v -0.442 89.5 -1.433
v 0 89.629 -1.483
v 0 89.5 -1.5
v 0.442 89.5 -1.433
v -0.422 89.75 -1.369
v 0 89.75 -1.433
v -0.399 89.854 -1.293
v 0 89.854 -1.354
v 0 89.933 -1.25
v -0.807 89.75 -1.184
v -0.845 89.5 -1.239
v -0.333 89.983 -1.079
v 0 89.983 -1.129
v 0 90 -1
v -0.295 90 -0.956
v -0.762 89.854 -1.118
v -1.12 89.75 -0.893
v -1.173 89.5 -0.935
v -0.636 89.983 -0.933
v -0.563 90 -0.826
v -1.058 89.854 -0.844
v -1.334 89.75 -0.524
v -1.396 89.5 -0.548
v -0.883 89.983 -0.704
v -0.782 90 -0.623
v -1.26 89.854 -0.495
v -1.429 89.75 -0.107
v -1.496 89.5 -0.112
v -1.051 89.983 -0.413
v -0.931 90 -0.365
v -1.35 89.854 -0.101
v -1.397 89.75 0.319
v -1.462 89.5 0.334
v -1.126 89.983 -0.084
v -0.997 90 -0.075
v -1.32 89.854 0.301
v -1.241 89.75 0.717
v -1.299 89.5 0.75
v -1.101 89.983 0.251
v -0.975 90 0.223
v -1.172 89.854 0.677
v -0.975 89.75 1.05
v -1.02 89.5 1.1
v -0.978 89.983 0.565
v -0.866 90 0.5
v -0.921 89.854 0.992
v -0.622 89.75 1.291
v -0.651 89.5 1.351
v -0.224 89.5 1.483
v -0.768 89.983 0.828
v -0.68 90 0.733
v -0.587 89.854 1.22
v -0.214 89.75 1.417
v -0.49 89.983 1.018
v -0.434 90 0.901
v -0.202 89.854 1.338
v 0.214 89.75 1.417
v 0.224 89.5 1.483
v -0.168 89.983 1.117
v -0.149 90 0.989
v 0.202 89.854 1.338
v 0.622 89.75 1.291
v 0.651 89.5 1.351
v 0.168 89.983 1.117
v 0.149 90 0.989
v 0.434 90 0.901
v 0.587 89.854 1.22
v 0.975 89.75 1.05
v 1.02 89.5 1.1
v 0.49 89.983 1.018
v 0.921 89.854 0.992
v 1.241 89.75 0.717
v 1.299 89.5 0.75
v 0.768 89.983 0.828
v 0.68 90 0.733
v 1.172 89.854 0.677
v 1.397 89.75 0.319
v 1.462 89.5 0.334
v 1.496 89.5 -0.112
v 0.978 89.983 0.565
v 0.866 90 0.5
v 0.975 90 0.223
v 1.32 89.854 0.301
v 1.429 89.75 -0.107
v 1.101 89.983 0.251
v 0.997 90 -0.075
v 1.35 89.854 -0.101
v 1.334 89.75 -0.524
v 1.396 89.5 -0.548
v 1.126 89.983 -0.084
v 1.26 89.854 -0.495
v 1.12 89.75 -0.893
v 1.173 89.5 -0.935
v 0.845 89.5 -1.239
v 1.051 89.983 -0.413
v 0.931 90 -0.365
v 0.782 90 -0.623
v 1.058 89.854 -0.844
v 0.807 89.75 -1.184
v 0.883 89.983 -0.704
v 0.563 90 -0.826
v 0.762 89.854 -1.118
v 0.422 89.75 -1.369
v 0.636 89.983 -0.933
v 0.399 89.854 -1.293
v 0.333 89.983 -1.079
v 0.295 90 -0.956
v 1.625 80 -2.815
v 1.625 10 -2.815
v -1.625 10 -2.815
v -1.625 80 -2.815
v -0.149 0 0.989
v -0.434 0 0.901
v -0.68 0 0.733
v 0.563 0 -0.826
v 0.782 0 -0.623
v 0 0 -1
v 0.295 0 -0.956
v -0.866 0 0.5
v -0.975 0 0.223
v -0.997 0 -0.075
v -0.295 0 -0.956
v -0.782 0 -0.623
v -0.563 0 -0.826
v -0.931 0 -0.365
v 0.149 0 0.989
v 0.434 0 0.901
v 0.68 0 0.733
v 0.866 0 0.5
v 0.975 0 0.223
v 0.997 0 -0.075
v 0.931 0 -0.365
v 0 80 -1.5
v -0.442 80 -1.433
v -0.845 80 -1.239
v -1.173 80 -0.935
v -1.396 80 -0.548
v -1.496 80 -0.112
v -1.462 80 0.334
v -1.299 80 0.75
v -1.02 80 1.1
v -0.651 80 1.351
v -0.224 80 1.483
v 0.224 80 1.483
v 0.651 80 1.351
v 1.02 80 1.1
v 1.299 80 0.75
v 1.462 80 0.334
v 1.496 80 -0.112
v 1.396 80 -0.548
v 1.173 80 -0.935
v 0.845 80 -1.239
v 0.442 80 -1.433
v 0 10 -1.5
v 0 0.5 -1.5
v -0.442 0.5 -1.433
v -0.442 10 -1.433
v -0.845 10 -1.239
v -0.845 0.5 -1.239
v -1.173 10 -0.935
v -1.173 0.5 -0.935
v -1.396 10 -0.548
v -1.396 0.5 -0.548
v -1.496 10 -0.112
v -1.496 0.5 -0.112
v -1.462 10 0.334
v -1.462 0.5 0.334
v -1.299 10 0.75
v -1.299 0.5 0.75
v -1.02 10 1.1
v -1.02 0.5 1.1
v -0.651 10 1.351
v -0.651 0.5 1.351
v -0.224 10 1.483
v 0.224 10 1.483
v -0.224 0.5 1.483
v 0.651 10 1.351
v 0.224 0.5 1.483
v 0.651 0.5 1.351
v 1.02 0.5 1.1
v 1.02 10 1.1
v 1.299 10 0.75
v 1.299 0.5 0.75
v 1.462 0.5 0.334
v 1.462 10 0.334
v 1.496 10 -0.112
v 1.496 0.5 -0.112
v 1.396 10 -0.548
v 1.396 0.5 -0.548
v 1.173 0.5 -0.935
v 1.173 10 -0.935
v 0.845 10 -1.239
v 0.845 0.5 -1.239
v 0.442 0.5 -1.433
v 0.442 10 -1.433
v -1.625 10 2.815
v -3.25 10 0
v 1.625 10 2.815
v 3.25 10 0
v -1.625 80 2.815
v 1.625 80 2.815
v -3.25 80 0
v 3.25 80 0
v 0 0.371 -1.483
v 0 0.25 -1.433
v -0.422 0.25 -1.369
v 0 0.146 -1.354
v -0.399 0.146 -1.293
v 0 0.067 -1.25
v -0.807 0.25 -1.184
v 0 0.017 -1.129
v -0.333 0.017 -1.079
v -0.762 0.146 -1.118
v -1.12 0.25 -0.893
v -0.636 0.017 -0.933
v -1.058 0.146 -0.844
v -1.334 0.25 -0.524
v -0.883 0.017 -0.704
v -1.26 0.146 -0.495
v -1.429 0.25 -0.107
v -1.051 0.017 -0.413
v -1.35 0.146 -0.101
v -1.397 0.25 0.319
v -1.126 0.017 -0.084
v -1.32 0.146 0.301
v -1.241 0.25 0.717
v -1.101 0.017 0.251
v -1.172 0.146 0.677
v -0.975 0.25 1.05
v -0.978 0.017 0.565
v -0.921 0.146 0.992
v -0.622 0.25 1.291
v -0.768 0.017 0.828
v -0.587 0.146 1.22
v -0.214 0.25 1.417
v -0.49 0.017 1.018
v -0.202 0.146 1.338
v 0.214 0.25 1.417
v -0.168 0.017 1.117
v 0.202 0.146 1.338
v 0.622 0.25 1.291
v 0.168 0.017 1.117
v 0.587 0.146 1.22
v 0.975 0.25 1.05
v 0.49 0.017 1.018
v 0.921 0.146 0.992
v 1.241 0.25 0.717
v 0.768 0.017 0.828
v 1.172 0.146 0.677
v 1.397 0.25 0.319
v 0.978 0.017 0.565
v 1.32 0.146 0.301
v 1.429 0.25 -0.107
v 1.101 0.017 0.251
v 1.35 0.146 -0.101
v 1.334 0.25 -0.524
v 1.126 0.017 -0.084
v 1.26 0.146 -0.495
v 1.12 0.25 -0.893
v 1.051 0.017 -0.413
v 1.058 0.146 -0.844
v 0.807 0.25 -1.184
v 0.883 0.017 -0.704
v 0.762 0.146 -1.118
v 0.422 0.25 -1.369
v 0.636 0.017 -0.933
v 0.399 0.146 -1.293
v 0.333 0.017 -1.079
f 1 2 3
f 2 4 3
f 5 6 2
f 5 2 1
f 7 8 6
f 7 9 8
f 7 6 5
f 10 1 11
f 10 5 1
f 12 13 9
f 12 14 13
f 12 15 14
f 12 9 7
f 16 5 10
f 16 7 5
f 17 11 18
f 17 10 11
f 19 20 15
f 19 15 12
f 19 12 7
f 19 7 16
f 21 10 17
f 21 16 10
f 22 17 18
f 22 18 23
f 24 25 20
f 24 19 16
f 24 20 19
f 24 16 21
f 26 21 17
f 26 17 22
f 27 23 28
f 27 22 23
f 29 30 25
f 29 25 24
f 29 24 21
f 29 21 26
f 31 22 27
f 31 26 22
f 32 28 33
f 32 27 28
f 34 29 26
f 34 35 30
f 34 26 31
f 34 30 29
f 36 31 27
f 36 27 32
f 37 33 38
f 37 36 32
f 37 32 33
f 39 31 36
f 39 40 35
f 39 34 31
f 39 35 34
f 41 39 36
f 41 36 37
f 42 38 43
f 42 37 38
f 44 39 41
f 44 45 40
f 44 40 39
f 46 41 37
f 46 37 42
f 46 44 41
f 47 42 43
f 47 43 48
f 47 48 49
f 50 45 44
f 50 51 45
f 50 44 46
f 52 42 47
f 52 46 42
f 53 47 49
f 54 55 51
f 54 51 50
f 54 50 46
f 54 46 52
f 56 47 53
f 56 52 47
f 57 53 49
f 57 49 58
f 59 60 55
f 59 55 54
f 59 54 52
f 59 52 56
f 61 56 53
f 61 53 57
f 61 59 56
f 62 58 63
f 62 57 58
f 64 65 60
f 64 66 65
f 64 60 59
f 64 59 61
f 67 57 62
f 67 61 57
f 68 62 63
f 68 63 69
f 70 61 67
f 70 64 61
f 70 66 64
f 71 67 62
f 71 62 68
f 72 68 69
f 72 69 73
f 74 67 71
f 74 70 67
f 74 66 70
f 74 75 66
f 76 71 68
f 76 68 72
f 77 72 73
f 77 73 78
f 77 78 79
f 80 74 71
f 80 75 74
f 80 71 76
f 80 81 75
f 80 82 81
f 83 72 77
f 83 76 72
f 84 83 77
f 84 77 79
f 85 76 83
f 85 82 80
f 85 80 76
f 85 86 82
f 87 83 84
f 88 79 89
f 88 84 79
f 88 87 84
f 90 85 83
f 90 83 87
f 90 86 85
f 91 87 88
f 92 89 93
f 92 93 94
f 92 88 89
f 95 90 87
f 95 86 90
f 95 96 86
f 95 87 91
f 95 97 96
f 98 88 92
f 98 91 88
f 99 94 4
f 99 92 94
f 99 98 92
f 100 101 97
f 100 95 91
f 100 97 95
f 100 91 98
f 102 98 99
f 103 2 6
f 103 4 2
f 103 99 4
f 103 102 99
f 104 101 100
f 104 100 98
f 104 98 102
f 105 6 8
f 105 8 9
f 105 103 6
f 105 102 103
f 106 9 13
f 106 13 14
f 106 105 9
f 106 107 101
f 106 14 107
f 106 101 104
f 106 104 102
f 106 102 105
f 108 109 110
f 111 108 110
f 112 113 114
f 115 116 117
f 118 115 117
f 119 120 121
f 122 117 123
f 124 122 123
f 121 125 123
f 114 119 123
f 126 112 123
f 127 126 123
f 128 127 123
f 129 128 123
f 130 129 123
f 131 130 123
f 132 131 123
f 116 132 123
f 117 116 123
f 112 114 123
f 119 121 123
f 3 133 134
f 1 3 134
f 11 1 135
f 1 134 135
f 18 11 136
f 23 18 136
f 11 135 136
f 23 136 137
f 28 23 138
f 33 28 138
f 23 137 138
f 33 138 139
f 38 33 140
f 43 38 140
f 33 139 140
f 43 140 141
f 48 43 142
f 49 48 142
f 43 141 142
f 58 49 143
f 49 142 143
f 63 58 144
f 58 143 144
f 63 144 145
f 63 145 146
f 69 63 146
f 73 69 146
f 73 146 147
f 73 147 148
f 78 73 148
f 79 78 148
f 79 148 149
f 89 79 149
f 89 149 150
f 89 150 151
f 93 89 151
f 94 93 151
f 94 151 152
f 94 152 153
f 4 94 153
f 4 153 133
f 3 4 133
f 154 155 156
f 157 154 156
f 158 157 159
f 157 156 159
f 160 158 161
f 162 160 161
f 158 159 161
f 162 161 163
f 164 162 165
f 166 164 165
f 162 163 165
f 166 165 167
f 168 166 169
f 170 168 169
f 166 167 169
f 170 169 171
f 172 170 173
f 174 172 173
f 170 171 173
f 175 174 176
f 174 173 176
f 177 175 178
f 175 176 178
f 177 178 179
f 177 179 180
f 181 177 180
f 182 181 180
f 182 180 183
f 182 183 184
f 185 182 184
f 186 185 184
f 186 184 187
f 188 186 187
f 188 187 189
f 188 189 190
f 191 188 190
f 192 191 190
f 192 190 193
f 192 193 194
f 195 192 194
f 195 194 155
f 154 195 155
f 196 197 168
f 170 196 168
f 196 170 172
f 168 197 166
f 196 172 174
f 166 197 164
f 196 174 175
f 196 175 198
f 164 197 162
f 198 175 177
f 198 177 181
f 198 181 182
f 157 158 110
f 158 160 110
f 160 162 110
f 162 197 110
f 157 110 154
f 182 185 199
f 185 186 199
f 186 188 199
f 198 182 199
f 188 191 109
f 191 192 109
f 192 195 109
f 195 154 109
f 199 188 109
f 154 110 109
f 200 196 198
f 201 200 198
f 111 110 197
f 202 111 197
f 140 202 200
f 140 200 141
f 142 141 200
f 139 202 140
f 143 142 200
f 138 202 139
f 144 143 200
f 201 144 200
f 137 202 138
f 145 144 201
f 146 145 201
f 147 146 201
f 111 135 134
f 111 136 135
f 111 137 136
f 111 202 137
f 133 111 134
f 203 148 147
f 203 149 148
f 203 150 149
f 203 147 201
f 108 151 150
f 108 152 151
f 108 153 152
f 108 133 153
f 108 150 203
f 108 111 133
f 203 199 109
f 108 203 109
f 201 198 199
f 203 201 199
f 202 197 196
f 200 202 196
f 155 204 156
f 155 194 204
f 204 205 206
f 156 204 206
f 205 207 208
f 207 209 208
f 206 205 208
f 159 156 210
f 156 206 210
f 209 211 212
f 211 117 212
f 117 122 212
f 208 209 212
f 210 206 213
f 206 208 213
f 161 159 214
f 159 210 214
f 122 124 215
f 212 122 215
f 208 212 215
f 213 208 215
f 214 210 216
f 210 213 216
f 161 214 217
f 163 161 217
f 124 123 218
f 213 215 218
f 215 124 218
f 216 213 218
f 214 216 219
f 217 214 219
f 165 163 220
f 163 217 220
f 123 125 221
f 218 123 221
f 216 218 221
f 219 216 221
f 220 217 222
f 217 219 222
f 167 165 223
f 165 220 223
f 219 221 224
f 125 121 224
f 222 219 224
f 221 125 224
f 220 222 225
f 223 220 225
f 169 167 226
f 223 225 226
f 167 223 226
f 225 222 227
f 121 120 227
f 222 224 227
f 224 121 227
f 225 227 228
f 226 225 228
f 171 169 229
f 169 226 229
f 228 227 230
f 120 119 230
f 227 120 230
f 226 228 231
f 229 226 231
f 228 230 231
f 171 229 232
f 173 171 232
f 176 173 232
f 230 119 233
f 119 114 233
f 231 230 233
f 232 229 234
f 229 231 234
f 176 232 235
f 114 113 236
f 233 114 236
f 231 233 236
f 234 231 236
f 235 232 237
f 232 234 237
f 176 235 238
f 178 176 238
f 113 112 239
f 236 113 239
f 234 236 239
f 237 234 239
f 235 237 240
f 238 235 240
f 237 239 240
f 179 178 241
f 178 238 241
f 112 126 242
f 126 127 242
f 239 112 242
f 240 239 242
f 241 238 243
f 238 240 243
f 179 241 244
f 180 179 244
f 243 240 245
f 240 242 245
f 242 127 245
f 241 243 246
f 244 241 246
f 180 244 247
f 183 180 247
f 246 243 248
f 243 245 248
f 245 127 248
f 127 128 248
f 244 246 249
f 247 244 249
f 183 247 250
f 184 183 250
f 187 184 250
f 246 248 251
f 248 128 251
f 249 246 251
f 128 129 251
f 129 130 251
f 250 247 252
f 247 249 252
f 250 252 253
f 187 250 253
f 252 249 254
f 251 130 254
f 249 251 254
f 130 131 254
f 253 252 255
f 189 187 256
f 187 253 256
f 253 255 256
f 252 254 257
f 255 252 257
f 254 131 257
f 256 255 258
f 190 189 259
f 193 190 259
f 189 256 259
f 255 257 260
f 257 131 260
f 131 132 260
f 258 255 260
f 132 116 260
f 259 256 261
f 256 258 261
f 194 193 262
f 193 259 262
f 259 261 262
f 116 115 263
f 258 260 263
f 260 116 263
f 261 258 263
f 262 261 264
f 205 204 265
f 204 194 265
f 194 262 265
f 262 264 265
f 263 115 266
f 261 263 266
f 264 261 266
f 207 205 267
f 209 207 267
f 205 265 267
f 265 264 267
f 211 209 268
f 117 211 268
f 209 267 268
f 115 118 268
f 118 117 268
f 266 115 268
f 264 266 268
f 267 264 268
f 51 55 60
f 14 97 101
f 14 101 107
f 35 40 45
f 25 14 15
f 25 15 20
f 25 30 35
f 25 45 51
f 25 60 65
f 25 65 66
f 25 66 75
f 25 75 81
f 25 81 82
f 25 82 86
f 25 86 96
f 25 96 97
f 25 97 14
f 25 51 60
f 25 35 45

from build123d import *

# Parameters (mm, degrees)
SKETCH_1_R          = 1.5
EXTRUDE_1_DEPTH     = 90
FILLET_1_R          = 0.5
SKETCH_2_R          = 1.5
EXTRUDE_2_DEPTH     = 80
SKETCH_2_3_R        = 1.5
CUT_EXTRUDE_2_DEPTH = 10


with BuildPart() as part:
    # 草图1 → 凸台-拉伸1 (new body)
    with BuildSketch(Plane(origin=(0, 0, 0), x_dir=(1, 0, 0), z_dir=(0, 1, 0))):
        Circle(SKETCH_1_R)
    extrude(amount=EXTRUDE_1_DEPTH)

    # 圆角1
    fillet_1_edges = [part.edges().sort_by_distance(p)[0] for p in [
        (-1.5, 0, 0),
        (-1.5, 90, 0),
    ]]
    fillet(fillet_1_edges, radius=FILLET_1_R)

    # 草图2 → 凸台-拉伸2 (add)
    with BuildSketch(Plane(origin=(0, 0, 0), x_dir=(1, 0, 0), z_dir=(0, 1, 0))):
        Polygon((-1.625, 2.814582562), (-3.25, 0), (-1.625, -2.814582562), (1.625, -2.814582562), (3.25, 0), (1.625, 2.814582562), align=None)
        Circle(SKETCH_2_R, mode=Mode.SUBTRACT)
    extrude(amount=EXTRUDE_2_DEPTH)

    # 草图2<3> → 切除-拉伸2 (cut)
    with BuildSketch(Plane(origin=(0, 0, 0), x_dir=(1, 0, 0), z_dir=(0, 1, 0))):
        Polygon((-1.625, 2.814582562), (-3.25, 0), (-1.625, -2.814582562), (1.625, -2.814582562), (3.25, 0), (1.625, 2.814582562), align=None)
        Circle(SKETCH_2_3_R, mode=Mode.SUBTRACT)
    extrude(amount=CUT_EXTRUDE_2_DEPTH, mode=Mode.SUBTRACT)


solid = part.part
